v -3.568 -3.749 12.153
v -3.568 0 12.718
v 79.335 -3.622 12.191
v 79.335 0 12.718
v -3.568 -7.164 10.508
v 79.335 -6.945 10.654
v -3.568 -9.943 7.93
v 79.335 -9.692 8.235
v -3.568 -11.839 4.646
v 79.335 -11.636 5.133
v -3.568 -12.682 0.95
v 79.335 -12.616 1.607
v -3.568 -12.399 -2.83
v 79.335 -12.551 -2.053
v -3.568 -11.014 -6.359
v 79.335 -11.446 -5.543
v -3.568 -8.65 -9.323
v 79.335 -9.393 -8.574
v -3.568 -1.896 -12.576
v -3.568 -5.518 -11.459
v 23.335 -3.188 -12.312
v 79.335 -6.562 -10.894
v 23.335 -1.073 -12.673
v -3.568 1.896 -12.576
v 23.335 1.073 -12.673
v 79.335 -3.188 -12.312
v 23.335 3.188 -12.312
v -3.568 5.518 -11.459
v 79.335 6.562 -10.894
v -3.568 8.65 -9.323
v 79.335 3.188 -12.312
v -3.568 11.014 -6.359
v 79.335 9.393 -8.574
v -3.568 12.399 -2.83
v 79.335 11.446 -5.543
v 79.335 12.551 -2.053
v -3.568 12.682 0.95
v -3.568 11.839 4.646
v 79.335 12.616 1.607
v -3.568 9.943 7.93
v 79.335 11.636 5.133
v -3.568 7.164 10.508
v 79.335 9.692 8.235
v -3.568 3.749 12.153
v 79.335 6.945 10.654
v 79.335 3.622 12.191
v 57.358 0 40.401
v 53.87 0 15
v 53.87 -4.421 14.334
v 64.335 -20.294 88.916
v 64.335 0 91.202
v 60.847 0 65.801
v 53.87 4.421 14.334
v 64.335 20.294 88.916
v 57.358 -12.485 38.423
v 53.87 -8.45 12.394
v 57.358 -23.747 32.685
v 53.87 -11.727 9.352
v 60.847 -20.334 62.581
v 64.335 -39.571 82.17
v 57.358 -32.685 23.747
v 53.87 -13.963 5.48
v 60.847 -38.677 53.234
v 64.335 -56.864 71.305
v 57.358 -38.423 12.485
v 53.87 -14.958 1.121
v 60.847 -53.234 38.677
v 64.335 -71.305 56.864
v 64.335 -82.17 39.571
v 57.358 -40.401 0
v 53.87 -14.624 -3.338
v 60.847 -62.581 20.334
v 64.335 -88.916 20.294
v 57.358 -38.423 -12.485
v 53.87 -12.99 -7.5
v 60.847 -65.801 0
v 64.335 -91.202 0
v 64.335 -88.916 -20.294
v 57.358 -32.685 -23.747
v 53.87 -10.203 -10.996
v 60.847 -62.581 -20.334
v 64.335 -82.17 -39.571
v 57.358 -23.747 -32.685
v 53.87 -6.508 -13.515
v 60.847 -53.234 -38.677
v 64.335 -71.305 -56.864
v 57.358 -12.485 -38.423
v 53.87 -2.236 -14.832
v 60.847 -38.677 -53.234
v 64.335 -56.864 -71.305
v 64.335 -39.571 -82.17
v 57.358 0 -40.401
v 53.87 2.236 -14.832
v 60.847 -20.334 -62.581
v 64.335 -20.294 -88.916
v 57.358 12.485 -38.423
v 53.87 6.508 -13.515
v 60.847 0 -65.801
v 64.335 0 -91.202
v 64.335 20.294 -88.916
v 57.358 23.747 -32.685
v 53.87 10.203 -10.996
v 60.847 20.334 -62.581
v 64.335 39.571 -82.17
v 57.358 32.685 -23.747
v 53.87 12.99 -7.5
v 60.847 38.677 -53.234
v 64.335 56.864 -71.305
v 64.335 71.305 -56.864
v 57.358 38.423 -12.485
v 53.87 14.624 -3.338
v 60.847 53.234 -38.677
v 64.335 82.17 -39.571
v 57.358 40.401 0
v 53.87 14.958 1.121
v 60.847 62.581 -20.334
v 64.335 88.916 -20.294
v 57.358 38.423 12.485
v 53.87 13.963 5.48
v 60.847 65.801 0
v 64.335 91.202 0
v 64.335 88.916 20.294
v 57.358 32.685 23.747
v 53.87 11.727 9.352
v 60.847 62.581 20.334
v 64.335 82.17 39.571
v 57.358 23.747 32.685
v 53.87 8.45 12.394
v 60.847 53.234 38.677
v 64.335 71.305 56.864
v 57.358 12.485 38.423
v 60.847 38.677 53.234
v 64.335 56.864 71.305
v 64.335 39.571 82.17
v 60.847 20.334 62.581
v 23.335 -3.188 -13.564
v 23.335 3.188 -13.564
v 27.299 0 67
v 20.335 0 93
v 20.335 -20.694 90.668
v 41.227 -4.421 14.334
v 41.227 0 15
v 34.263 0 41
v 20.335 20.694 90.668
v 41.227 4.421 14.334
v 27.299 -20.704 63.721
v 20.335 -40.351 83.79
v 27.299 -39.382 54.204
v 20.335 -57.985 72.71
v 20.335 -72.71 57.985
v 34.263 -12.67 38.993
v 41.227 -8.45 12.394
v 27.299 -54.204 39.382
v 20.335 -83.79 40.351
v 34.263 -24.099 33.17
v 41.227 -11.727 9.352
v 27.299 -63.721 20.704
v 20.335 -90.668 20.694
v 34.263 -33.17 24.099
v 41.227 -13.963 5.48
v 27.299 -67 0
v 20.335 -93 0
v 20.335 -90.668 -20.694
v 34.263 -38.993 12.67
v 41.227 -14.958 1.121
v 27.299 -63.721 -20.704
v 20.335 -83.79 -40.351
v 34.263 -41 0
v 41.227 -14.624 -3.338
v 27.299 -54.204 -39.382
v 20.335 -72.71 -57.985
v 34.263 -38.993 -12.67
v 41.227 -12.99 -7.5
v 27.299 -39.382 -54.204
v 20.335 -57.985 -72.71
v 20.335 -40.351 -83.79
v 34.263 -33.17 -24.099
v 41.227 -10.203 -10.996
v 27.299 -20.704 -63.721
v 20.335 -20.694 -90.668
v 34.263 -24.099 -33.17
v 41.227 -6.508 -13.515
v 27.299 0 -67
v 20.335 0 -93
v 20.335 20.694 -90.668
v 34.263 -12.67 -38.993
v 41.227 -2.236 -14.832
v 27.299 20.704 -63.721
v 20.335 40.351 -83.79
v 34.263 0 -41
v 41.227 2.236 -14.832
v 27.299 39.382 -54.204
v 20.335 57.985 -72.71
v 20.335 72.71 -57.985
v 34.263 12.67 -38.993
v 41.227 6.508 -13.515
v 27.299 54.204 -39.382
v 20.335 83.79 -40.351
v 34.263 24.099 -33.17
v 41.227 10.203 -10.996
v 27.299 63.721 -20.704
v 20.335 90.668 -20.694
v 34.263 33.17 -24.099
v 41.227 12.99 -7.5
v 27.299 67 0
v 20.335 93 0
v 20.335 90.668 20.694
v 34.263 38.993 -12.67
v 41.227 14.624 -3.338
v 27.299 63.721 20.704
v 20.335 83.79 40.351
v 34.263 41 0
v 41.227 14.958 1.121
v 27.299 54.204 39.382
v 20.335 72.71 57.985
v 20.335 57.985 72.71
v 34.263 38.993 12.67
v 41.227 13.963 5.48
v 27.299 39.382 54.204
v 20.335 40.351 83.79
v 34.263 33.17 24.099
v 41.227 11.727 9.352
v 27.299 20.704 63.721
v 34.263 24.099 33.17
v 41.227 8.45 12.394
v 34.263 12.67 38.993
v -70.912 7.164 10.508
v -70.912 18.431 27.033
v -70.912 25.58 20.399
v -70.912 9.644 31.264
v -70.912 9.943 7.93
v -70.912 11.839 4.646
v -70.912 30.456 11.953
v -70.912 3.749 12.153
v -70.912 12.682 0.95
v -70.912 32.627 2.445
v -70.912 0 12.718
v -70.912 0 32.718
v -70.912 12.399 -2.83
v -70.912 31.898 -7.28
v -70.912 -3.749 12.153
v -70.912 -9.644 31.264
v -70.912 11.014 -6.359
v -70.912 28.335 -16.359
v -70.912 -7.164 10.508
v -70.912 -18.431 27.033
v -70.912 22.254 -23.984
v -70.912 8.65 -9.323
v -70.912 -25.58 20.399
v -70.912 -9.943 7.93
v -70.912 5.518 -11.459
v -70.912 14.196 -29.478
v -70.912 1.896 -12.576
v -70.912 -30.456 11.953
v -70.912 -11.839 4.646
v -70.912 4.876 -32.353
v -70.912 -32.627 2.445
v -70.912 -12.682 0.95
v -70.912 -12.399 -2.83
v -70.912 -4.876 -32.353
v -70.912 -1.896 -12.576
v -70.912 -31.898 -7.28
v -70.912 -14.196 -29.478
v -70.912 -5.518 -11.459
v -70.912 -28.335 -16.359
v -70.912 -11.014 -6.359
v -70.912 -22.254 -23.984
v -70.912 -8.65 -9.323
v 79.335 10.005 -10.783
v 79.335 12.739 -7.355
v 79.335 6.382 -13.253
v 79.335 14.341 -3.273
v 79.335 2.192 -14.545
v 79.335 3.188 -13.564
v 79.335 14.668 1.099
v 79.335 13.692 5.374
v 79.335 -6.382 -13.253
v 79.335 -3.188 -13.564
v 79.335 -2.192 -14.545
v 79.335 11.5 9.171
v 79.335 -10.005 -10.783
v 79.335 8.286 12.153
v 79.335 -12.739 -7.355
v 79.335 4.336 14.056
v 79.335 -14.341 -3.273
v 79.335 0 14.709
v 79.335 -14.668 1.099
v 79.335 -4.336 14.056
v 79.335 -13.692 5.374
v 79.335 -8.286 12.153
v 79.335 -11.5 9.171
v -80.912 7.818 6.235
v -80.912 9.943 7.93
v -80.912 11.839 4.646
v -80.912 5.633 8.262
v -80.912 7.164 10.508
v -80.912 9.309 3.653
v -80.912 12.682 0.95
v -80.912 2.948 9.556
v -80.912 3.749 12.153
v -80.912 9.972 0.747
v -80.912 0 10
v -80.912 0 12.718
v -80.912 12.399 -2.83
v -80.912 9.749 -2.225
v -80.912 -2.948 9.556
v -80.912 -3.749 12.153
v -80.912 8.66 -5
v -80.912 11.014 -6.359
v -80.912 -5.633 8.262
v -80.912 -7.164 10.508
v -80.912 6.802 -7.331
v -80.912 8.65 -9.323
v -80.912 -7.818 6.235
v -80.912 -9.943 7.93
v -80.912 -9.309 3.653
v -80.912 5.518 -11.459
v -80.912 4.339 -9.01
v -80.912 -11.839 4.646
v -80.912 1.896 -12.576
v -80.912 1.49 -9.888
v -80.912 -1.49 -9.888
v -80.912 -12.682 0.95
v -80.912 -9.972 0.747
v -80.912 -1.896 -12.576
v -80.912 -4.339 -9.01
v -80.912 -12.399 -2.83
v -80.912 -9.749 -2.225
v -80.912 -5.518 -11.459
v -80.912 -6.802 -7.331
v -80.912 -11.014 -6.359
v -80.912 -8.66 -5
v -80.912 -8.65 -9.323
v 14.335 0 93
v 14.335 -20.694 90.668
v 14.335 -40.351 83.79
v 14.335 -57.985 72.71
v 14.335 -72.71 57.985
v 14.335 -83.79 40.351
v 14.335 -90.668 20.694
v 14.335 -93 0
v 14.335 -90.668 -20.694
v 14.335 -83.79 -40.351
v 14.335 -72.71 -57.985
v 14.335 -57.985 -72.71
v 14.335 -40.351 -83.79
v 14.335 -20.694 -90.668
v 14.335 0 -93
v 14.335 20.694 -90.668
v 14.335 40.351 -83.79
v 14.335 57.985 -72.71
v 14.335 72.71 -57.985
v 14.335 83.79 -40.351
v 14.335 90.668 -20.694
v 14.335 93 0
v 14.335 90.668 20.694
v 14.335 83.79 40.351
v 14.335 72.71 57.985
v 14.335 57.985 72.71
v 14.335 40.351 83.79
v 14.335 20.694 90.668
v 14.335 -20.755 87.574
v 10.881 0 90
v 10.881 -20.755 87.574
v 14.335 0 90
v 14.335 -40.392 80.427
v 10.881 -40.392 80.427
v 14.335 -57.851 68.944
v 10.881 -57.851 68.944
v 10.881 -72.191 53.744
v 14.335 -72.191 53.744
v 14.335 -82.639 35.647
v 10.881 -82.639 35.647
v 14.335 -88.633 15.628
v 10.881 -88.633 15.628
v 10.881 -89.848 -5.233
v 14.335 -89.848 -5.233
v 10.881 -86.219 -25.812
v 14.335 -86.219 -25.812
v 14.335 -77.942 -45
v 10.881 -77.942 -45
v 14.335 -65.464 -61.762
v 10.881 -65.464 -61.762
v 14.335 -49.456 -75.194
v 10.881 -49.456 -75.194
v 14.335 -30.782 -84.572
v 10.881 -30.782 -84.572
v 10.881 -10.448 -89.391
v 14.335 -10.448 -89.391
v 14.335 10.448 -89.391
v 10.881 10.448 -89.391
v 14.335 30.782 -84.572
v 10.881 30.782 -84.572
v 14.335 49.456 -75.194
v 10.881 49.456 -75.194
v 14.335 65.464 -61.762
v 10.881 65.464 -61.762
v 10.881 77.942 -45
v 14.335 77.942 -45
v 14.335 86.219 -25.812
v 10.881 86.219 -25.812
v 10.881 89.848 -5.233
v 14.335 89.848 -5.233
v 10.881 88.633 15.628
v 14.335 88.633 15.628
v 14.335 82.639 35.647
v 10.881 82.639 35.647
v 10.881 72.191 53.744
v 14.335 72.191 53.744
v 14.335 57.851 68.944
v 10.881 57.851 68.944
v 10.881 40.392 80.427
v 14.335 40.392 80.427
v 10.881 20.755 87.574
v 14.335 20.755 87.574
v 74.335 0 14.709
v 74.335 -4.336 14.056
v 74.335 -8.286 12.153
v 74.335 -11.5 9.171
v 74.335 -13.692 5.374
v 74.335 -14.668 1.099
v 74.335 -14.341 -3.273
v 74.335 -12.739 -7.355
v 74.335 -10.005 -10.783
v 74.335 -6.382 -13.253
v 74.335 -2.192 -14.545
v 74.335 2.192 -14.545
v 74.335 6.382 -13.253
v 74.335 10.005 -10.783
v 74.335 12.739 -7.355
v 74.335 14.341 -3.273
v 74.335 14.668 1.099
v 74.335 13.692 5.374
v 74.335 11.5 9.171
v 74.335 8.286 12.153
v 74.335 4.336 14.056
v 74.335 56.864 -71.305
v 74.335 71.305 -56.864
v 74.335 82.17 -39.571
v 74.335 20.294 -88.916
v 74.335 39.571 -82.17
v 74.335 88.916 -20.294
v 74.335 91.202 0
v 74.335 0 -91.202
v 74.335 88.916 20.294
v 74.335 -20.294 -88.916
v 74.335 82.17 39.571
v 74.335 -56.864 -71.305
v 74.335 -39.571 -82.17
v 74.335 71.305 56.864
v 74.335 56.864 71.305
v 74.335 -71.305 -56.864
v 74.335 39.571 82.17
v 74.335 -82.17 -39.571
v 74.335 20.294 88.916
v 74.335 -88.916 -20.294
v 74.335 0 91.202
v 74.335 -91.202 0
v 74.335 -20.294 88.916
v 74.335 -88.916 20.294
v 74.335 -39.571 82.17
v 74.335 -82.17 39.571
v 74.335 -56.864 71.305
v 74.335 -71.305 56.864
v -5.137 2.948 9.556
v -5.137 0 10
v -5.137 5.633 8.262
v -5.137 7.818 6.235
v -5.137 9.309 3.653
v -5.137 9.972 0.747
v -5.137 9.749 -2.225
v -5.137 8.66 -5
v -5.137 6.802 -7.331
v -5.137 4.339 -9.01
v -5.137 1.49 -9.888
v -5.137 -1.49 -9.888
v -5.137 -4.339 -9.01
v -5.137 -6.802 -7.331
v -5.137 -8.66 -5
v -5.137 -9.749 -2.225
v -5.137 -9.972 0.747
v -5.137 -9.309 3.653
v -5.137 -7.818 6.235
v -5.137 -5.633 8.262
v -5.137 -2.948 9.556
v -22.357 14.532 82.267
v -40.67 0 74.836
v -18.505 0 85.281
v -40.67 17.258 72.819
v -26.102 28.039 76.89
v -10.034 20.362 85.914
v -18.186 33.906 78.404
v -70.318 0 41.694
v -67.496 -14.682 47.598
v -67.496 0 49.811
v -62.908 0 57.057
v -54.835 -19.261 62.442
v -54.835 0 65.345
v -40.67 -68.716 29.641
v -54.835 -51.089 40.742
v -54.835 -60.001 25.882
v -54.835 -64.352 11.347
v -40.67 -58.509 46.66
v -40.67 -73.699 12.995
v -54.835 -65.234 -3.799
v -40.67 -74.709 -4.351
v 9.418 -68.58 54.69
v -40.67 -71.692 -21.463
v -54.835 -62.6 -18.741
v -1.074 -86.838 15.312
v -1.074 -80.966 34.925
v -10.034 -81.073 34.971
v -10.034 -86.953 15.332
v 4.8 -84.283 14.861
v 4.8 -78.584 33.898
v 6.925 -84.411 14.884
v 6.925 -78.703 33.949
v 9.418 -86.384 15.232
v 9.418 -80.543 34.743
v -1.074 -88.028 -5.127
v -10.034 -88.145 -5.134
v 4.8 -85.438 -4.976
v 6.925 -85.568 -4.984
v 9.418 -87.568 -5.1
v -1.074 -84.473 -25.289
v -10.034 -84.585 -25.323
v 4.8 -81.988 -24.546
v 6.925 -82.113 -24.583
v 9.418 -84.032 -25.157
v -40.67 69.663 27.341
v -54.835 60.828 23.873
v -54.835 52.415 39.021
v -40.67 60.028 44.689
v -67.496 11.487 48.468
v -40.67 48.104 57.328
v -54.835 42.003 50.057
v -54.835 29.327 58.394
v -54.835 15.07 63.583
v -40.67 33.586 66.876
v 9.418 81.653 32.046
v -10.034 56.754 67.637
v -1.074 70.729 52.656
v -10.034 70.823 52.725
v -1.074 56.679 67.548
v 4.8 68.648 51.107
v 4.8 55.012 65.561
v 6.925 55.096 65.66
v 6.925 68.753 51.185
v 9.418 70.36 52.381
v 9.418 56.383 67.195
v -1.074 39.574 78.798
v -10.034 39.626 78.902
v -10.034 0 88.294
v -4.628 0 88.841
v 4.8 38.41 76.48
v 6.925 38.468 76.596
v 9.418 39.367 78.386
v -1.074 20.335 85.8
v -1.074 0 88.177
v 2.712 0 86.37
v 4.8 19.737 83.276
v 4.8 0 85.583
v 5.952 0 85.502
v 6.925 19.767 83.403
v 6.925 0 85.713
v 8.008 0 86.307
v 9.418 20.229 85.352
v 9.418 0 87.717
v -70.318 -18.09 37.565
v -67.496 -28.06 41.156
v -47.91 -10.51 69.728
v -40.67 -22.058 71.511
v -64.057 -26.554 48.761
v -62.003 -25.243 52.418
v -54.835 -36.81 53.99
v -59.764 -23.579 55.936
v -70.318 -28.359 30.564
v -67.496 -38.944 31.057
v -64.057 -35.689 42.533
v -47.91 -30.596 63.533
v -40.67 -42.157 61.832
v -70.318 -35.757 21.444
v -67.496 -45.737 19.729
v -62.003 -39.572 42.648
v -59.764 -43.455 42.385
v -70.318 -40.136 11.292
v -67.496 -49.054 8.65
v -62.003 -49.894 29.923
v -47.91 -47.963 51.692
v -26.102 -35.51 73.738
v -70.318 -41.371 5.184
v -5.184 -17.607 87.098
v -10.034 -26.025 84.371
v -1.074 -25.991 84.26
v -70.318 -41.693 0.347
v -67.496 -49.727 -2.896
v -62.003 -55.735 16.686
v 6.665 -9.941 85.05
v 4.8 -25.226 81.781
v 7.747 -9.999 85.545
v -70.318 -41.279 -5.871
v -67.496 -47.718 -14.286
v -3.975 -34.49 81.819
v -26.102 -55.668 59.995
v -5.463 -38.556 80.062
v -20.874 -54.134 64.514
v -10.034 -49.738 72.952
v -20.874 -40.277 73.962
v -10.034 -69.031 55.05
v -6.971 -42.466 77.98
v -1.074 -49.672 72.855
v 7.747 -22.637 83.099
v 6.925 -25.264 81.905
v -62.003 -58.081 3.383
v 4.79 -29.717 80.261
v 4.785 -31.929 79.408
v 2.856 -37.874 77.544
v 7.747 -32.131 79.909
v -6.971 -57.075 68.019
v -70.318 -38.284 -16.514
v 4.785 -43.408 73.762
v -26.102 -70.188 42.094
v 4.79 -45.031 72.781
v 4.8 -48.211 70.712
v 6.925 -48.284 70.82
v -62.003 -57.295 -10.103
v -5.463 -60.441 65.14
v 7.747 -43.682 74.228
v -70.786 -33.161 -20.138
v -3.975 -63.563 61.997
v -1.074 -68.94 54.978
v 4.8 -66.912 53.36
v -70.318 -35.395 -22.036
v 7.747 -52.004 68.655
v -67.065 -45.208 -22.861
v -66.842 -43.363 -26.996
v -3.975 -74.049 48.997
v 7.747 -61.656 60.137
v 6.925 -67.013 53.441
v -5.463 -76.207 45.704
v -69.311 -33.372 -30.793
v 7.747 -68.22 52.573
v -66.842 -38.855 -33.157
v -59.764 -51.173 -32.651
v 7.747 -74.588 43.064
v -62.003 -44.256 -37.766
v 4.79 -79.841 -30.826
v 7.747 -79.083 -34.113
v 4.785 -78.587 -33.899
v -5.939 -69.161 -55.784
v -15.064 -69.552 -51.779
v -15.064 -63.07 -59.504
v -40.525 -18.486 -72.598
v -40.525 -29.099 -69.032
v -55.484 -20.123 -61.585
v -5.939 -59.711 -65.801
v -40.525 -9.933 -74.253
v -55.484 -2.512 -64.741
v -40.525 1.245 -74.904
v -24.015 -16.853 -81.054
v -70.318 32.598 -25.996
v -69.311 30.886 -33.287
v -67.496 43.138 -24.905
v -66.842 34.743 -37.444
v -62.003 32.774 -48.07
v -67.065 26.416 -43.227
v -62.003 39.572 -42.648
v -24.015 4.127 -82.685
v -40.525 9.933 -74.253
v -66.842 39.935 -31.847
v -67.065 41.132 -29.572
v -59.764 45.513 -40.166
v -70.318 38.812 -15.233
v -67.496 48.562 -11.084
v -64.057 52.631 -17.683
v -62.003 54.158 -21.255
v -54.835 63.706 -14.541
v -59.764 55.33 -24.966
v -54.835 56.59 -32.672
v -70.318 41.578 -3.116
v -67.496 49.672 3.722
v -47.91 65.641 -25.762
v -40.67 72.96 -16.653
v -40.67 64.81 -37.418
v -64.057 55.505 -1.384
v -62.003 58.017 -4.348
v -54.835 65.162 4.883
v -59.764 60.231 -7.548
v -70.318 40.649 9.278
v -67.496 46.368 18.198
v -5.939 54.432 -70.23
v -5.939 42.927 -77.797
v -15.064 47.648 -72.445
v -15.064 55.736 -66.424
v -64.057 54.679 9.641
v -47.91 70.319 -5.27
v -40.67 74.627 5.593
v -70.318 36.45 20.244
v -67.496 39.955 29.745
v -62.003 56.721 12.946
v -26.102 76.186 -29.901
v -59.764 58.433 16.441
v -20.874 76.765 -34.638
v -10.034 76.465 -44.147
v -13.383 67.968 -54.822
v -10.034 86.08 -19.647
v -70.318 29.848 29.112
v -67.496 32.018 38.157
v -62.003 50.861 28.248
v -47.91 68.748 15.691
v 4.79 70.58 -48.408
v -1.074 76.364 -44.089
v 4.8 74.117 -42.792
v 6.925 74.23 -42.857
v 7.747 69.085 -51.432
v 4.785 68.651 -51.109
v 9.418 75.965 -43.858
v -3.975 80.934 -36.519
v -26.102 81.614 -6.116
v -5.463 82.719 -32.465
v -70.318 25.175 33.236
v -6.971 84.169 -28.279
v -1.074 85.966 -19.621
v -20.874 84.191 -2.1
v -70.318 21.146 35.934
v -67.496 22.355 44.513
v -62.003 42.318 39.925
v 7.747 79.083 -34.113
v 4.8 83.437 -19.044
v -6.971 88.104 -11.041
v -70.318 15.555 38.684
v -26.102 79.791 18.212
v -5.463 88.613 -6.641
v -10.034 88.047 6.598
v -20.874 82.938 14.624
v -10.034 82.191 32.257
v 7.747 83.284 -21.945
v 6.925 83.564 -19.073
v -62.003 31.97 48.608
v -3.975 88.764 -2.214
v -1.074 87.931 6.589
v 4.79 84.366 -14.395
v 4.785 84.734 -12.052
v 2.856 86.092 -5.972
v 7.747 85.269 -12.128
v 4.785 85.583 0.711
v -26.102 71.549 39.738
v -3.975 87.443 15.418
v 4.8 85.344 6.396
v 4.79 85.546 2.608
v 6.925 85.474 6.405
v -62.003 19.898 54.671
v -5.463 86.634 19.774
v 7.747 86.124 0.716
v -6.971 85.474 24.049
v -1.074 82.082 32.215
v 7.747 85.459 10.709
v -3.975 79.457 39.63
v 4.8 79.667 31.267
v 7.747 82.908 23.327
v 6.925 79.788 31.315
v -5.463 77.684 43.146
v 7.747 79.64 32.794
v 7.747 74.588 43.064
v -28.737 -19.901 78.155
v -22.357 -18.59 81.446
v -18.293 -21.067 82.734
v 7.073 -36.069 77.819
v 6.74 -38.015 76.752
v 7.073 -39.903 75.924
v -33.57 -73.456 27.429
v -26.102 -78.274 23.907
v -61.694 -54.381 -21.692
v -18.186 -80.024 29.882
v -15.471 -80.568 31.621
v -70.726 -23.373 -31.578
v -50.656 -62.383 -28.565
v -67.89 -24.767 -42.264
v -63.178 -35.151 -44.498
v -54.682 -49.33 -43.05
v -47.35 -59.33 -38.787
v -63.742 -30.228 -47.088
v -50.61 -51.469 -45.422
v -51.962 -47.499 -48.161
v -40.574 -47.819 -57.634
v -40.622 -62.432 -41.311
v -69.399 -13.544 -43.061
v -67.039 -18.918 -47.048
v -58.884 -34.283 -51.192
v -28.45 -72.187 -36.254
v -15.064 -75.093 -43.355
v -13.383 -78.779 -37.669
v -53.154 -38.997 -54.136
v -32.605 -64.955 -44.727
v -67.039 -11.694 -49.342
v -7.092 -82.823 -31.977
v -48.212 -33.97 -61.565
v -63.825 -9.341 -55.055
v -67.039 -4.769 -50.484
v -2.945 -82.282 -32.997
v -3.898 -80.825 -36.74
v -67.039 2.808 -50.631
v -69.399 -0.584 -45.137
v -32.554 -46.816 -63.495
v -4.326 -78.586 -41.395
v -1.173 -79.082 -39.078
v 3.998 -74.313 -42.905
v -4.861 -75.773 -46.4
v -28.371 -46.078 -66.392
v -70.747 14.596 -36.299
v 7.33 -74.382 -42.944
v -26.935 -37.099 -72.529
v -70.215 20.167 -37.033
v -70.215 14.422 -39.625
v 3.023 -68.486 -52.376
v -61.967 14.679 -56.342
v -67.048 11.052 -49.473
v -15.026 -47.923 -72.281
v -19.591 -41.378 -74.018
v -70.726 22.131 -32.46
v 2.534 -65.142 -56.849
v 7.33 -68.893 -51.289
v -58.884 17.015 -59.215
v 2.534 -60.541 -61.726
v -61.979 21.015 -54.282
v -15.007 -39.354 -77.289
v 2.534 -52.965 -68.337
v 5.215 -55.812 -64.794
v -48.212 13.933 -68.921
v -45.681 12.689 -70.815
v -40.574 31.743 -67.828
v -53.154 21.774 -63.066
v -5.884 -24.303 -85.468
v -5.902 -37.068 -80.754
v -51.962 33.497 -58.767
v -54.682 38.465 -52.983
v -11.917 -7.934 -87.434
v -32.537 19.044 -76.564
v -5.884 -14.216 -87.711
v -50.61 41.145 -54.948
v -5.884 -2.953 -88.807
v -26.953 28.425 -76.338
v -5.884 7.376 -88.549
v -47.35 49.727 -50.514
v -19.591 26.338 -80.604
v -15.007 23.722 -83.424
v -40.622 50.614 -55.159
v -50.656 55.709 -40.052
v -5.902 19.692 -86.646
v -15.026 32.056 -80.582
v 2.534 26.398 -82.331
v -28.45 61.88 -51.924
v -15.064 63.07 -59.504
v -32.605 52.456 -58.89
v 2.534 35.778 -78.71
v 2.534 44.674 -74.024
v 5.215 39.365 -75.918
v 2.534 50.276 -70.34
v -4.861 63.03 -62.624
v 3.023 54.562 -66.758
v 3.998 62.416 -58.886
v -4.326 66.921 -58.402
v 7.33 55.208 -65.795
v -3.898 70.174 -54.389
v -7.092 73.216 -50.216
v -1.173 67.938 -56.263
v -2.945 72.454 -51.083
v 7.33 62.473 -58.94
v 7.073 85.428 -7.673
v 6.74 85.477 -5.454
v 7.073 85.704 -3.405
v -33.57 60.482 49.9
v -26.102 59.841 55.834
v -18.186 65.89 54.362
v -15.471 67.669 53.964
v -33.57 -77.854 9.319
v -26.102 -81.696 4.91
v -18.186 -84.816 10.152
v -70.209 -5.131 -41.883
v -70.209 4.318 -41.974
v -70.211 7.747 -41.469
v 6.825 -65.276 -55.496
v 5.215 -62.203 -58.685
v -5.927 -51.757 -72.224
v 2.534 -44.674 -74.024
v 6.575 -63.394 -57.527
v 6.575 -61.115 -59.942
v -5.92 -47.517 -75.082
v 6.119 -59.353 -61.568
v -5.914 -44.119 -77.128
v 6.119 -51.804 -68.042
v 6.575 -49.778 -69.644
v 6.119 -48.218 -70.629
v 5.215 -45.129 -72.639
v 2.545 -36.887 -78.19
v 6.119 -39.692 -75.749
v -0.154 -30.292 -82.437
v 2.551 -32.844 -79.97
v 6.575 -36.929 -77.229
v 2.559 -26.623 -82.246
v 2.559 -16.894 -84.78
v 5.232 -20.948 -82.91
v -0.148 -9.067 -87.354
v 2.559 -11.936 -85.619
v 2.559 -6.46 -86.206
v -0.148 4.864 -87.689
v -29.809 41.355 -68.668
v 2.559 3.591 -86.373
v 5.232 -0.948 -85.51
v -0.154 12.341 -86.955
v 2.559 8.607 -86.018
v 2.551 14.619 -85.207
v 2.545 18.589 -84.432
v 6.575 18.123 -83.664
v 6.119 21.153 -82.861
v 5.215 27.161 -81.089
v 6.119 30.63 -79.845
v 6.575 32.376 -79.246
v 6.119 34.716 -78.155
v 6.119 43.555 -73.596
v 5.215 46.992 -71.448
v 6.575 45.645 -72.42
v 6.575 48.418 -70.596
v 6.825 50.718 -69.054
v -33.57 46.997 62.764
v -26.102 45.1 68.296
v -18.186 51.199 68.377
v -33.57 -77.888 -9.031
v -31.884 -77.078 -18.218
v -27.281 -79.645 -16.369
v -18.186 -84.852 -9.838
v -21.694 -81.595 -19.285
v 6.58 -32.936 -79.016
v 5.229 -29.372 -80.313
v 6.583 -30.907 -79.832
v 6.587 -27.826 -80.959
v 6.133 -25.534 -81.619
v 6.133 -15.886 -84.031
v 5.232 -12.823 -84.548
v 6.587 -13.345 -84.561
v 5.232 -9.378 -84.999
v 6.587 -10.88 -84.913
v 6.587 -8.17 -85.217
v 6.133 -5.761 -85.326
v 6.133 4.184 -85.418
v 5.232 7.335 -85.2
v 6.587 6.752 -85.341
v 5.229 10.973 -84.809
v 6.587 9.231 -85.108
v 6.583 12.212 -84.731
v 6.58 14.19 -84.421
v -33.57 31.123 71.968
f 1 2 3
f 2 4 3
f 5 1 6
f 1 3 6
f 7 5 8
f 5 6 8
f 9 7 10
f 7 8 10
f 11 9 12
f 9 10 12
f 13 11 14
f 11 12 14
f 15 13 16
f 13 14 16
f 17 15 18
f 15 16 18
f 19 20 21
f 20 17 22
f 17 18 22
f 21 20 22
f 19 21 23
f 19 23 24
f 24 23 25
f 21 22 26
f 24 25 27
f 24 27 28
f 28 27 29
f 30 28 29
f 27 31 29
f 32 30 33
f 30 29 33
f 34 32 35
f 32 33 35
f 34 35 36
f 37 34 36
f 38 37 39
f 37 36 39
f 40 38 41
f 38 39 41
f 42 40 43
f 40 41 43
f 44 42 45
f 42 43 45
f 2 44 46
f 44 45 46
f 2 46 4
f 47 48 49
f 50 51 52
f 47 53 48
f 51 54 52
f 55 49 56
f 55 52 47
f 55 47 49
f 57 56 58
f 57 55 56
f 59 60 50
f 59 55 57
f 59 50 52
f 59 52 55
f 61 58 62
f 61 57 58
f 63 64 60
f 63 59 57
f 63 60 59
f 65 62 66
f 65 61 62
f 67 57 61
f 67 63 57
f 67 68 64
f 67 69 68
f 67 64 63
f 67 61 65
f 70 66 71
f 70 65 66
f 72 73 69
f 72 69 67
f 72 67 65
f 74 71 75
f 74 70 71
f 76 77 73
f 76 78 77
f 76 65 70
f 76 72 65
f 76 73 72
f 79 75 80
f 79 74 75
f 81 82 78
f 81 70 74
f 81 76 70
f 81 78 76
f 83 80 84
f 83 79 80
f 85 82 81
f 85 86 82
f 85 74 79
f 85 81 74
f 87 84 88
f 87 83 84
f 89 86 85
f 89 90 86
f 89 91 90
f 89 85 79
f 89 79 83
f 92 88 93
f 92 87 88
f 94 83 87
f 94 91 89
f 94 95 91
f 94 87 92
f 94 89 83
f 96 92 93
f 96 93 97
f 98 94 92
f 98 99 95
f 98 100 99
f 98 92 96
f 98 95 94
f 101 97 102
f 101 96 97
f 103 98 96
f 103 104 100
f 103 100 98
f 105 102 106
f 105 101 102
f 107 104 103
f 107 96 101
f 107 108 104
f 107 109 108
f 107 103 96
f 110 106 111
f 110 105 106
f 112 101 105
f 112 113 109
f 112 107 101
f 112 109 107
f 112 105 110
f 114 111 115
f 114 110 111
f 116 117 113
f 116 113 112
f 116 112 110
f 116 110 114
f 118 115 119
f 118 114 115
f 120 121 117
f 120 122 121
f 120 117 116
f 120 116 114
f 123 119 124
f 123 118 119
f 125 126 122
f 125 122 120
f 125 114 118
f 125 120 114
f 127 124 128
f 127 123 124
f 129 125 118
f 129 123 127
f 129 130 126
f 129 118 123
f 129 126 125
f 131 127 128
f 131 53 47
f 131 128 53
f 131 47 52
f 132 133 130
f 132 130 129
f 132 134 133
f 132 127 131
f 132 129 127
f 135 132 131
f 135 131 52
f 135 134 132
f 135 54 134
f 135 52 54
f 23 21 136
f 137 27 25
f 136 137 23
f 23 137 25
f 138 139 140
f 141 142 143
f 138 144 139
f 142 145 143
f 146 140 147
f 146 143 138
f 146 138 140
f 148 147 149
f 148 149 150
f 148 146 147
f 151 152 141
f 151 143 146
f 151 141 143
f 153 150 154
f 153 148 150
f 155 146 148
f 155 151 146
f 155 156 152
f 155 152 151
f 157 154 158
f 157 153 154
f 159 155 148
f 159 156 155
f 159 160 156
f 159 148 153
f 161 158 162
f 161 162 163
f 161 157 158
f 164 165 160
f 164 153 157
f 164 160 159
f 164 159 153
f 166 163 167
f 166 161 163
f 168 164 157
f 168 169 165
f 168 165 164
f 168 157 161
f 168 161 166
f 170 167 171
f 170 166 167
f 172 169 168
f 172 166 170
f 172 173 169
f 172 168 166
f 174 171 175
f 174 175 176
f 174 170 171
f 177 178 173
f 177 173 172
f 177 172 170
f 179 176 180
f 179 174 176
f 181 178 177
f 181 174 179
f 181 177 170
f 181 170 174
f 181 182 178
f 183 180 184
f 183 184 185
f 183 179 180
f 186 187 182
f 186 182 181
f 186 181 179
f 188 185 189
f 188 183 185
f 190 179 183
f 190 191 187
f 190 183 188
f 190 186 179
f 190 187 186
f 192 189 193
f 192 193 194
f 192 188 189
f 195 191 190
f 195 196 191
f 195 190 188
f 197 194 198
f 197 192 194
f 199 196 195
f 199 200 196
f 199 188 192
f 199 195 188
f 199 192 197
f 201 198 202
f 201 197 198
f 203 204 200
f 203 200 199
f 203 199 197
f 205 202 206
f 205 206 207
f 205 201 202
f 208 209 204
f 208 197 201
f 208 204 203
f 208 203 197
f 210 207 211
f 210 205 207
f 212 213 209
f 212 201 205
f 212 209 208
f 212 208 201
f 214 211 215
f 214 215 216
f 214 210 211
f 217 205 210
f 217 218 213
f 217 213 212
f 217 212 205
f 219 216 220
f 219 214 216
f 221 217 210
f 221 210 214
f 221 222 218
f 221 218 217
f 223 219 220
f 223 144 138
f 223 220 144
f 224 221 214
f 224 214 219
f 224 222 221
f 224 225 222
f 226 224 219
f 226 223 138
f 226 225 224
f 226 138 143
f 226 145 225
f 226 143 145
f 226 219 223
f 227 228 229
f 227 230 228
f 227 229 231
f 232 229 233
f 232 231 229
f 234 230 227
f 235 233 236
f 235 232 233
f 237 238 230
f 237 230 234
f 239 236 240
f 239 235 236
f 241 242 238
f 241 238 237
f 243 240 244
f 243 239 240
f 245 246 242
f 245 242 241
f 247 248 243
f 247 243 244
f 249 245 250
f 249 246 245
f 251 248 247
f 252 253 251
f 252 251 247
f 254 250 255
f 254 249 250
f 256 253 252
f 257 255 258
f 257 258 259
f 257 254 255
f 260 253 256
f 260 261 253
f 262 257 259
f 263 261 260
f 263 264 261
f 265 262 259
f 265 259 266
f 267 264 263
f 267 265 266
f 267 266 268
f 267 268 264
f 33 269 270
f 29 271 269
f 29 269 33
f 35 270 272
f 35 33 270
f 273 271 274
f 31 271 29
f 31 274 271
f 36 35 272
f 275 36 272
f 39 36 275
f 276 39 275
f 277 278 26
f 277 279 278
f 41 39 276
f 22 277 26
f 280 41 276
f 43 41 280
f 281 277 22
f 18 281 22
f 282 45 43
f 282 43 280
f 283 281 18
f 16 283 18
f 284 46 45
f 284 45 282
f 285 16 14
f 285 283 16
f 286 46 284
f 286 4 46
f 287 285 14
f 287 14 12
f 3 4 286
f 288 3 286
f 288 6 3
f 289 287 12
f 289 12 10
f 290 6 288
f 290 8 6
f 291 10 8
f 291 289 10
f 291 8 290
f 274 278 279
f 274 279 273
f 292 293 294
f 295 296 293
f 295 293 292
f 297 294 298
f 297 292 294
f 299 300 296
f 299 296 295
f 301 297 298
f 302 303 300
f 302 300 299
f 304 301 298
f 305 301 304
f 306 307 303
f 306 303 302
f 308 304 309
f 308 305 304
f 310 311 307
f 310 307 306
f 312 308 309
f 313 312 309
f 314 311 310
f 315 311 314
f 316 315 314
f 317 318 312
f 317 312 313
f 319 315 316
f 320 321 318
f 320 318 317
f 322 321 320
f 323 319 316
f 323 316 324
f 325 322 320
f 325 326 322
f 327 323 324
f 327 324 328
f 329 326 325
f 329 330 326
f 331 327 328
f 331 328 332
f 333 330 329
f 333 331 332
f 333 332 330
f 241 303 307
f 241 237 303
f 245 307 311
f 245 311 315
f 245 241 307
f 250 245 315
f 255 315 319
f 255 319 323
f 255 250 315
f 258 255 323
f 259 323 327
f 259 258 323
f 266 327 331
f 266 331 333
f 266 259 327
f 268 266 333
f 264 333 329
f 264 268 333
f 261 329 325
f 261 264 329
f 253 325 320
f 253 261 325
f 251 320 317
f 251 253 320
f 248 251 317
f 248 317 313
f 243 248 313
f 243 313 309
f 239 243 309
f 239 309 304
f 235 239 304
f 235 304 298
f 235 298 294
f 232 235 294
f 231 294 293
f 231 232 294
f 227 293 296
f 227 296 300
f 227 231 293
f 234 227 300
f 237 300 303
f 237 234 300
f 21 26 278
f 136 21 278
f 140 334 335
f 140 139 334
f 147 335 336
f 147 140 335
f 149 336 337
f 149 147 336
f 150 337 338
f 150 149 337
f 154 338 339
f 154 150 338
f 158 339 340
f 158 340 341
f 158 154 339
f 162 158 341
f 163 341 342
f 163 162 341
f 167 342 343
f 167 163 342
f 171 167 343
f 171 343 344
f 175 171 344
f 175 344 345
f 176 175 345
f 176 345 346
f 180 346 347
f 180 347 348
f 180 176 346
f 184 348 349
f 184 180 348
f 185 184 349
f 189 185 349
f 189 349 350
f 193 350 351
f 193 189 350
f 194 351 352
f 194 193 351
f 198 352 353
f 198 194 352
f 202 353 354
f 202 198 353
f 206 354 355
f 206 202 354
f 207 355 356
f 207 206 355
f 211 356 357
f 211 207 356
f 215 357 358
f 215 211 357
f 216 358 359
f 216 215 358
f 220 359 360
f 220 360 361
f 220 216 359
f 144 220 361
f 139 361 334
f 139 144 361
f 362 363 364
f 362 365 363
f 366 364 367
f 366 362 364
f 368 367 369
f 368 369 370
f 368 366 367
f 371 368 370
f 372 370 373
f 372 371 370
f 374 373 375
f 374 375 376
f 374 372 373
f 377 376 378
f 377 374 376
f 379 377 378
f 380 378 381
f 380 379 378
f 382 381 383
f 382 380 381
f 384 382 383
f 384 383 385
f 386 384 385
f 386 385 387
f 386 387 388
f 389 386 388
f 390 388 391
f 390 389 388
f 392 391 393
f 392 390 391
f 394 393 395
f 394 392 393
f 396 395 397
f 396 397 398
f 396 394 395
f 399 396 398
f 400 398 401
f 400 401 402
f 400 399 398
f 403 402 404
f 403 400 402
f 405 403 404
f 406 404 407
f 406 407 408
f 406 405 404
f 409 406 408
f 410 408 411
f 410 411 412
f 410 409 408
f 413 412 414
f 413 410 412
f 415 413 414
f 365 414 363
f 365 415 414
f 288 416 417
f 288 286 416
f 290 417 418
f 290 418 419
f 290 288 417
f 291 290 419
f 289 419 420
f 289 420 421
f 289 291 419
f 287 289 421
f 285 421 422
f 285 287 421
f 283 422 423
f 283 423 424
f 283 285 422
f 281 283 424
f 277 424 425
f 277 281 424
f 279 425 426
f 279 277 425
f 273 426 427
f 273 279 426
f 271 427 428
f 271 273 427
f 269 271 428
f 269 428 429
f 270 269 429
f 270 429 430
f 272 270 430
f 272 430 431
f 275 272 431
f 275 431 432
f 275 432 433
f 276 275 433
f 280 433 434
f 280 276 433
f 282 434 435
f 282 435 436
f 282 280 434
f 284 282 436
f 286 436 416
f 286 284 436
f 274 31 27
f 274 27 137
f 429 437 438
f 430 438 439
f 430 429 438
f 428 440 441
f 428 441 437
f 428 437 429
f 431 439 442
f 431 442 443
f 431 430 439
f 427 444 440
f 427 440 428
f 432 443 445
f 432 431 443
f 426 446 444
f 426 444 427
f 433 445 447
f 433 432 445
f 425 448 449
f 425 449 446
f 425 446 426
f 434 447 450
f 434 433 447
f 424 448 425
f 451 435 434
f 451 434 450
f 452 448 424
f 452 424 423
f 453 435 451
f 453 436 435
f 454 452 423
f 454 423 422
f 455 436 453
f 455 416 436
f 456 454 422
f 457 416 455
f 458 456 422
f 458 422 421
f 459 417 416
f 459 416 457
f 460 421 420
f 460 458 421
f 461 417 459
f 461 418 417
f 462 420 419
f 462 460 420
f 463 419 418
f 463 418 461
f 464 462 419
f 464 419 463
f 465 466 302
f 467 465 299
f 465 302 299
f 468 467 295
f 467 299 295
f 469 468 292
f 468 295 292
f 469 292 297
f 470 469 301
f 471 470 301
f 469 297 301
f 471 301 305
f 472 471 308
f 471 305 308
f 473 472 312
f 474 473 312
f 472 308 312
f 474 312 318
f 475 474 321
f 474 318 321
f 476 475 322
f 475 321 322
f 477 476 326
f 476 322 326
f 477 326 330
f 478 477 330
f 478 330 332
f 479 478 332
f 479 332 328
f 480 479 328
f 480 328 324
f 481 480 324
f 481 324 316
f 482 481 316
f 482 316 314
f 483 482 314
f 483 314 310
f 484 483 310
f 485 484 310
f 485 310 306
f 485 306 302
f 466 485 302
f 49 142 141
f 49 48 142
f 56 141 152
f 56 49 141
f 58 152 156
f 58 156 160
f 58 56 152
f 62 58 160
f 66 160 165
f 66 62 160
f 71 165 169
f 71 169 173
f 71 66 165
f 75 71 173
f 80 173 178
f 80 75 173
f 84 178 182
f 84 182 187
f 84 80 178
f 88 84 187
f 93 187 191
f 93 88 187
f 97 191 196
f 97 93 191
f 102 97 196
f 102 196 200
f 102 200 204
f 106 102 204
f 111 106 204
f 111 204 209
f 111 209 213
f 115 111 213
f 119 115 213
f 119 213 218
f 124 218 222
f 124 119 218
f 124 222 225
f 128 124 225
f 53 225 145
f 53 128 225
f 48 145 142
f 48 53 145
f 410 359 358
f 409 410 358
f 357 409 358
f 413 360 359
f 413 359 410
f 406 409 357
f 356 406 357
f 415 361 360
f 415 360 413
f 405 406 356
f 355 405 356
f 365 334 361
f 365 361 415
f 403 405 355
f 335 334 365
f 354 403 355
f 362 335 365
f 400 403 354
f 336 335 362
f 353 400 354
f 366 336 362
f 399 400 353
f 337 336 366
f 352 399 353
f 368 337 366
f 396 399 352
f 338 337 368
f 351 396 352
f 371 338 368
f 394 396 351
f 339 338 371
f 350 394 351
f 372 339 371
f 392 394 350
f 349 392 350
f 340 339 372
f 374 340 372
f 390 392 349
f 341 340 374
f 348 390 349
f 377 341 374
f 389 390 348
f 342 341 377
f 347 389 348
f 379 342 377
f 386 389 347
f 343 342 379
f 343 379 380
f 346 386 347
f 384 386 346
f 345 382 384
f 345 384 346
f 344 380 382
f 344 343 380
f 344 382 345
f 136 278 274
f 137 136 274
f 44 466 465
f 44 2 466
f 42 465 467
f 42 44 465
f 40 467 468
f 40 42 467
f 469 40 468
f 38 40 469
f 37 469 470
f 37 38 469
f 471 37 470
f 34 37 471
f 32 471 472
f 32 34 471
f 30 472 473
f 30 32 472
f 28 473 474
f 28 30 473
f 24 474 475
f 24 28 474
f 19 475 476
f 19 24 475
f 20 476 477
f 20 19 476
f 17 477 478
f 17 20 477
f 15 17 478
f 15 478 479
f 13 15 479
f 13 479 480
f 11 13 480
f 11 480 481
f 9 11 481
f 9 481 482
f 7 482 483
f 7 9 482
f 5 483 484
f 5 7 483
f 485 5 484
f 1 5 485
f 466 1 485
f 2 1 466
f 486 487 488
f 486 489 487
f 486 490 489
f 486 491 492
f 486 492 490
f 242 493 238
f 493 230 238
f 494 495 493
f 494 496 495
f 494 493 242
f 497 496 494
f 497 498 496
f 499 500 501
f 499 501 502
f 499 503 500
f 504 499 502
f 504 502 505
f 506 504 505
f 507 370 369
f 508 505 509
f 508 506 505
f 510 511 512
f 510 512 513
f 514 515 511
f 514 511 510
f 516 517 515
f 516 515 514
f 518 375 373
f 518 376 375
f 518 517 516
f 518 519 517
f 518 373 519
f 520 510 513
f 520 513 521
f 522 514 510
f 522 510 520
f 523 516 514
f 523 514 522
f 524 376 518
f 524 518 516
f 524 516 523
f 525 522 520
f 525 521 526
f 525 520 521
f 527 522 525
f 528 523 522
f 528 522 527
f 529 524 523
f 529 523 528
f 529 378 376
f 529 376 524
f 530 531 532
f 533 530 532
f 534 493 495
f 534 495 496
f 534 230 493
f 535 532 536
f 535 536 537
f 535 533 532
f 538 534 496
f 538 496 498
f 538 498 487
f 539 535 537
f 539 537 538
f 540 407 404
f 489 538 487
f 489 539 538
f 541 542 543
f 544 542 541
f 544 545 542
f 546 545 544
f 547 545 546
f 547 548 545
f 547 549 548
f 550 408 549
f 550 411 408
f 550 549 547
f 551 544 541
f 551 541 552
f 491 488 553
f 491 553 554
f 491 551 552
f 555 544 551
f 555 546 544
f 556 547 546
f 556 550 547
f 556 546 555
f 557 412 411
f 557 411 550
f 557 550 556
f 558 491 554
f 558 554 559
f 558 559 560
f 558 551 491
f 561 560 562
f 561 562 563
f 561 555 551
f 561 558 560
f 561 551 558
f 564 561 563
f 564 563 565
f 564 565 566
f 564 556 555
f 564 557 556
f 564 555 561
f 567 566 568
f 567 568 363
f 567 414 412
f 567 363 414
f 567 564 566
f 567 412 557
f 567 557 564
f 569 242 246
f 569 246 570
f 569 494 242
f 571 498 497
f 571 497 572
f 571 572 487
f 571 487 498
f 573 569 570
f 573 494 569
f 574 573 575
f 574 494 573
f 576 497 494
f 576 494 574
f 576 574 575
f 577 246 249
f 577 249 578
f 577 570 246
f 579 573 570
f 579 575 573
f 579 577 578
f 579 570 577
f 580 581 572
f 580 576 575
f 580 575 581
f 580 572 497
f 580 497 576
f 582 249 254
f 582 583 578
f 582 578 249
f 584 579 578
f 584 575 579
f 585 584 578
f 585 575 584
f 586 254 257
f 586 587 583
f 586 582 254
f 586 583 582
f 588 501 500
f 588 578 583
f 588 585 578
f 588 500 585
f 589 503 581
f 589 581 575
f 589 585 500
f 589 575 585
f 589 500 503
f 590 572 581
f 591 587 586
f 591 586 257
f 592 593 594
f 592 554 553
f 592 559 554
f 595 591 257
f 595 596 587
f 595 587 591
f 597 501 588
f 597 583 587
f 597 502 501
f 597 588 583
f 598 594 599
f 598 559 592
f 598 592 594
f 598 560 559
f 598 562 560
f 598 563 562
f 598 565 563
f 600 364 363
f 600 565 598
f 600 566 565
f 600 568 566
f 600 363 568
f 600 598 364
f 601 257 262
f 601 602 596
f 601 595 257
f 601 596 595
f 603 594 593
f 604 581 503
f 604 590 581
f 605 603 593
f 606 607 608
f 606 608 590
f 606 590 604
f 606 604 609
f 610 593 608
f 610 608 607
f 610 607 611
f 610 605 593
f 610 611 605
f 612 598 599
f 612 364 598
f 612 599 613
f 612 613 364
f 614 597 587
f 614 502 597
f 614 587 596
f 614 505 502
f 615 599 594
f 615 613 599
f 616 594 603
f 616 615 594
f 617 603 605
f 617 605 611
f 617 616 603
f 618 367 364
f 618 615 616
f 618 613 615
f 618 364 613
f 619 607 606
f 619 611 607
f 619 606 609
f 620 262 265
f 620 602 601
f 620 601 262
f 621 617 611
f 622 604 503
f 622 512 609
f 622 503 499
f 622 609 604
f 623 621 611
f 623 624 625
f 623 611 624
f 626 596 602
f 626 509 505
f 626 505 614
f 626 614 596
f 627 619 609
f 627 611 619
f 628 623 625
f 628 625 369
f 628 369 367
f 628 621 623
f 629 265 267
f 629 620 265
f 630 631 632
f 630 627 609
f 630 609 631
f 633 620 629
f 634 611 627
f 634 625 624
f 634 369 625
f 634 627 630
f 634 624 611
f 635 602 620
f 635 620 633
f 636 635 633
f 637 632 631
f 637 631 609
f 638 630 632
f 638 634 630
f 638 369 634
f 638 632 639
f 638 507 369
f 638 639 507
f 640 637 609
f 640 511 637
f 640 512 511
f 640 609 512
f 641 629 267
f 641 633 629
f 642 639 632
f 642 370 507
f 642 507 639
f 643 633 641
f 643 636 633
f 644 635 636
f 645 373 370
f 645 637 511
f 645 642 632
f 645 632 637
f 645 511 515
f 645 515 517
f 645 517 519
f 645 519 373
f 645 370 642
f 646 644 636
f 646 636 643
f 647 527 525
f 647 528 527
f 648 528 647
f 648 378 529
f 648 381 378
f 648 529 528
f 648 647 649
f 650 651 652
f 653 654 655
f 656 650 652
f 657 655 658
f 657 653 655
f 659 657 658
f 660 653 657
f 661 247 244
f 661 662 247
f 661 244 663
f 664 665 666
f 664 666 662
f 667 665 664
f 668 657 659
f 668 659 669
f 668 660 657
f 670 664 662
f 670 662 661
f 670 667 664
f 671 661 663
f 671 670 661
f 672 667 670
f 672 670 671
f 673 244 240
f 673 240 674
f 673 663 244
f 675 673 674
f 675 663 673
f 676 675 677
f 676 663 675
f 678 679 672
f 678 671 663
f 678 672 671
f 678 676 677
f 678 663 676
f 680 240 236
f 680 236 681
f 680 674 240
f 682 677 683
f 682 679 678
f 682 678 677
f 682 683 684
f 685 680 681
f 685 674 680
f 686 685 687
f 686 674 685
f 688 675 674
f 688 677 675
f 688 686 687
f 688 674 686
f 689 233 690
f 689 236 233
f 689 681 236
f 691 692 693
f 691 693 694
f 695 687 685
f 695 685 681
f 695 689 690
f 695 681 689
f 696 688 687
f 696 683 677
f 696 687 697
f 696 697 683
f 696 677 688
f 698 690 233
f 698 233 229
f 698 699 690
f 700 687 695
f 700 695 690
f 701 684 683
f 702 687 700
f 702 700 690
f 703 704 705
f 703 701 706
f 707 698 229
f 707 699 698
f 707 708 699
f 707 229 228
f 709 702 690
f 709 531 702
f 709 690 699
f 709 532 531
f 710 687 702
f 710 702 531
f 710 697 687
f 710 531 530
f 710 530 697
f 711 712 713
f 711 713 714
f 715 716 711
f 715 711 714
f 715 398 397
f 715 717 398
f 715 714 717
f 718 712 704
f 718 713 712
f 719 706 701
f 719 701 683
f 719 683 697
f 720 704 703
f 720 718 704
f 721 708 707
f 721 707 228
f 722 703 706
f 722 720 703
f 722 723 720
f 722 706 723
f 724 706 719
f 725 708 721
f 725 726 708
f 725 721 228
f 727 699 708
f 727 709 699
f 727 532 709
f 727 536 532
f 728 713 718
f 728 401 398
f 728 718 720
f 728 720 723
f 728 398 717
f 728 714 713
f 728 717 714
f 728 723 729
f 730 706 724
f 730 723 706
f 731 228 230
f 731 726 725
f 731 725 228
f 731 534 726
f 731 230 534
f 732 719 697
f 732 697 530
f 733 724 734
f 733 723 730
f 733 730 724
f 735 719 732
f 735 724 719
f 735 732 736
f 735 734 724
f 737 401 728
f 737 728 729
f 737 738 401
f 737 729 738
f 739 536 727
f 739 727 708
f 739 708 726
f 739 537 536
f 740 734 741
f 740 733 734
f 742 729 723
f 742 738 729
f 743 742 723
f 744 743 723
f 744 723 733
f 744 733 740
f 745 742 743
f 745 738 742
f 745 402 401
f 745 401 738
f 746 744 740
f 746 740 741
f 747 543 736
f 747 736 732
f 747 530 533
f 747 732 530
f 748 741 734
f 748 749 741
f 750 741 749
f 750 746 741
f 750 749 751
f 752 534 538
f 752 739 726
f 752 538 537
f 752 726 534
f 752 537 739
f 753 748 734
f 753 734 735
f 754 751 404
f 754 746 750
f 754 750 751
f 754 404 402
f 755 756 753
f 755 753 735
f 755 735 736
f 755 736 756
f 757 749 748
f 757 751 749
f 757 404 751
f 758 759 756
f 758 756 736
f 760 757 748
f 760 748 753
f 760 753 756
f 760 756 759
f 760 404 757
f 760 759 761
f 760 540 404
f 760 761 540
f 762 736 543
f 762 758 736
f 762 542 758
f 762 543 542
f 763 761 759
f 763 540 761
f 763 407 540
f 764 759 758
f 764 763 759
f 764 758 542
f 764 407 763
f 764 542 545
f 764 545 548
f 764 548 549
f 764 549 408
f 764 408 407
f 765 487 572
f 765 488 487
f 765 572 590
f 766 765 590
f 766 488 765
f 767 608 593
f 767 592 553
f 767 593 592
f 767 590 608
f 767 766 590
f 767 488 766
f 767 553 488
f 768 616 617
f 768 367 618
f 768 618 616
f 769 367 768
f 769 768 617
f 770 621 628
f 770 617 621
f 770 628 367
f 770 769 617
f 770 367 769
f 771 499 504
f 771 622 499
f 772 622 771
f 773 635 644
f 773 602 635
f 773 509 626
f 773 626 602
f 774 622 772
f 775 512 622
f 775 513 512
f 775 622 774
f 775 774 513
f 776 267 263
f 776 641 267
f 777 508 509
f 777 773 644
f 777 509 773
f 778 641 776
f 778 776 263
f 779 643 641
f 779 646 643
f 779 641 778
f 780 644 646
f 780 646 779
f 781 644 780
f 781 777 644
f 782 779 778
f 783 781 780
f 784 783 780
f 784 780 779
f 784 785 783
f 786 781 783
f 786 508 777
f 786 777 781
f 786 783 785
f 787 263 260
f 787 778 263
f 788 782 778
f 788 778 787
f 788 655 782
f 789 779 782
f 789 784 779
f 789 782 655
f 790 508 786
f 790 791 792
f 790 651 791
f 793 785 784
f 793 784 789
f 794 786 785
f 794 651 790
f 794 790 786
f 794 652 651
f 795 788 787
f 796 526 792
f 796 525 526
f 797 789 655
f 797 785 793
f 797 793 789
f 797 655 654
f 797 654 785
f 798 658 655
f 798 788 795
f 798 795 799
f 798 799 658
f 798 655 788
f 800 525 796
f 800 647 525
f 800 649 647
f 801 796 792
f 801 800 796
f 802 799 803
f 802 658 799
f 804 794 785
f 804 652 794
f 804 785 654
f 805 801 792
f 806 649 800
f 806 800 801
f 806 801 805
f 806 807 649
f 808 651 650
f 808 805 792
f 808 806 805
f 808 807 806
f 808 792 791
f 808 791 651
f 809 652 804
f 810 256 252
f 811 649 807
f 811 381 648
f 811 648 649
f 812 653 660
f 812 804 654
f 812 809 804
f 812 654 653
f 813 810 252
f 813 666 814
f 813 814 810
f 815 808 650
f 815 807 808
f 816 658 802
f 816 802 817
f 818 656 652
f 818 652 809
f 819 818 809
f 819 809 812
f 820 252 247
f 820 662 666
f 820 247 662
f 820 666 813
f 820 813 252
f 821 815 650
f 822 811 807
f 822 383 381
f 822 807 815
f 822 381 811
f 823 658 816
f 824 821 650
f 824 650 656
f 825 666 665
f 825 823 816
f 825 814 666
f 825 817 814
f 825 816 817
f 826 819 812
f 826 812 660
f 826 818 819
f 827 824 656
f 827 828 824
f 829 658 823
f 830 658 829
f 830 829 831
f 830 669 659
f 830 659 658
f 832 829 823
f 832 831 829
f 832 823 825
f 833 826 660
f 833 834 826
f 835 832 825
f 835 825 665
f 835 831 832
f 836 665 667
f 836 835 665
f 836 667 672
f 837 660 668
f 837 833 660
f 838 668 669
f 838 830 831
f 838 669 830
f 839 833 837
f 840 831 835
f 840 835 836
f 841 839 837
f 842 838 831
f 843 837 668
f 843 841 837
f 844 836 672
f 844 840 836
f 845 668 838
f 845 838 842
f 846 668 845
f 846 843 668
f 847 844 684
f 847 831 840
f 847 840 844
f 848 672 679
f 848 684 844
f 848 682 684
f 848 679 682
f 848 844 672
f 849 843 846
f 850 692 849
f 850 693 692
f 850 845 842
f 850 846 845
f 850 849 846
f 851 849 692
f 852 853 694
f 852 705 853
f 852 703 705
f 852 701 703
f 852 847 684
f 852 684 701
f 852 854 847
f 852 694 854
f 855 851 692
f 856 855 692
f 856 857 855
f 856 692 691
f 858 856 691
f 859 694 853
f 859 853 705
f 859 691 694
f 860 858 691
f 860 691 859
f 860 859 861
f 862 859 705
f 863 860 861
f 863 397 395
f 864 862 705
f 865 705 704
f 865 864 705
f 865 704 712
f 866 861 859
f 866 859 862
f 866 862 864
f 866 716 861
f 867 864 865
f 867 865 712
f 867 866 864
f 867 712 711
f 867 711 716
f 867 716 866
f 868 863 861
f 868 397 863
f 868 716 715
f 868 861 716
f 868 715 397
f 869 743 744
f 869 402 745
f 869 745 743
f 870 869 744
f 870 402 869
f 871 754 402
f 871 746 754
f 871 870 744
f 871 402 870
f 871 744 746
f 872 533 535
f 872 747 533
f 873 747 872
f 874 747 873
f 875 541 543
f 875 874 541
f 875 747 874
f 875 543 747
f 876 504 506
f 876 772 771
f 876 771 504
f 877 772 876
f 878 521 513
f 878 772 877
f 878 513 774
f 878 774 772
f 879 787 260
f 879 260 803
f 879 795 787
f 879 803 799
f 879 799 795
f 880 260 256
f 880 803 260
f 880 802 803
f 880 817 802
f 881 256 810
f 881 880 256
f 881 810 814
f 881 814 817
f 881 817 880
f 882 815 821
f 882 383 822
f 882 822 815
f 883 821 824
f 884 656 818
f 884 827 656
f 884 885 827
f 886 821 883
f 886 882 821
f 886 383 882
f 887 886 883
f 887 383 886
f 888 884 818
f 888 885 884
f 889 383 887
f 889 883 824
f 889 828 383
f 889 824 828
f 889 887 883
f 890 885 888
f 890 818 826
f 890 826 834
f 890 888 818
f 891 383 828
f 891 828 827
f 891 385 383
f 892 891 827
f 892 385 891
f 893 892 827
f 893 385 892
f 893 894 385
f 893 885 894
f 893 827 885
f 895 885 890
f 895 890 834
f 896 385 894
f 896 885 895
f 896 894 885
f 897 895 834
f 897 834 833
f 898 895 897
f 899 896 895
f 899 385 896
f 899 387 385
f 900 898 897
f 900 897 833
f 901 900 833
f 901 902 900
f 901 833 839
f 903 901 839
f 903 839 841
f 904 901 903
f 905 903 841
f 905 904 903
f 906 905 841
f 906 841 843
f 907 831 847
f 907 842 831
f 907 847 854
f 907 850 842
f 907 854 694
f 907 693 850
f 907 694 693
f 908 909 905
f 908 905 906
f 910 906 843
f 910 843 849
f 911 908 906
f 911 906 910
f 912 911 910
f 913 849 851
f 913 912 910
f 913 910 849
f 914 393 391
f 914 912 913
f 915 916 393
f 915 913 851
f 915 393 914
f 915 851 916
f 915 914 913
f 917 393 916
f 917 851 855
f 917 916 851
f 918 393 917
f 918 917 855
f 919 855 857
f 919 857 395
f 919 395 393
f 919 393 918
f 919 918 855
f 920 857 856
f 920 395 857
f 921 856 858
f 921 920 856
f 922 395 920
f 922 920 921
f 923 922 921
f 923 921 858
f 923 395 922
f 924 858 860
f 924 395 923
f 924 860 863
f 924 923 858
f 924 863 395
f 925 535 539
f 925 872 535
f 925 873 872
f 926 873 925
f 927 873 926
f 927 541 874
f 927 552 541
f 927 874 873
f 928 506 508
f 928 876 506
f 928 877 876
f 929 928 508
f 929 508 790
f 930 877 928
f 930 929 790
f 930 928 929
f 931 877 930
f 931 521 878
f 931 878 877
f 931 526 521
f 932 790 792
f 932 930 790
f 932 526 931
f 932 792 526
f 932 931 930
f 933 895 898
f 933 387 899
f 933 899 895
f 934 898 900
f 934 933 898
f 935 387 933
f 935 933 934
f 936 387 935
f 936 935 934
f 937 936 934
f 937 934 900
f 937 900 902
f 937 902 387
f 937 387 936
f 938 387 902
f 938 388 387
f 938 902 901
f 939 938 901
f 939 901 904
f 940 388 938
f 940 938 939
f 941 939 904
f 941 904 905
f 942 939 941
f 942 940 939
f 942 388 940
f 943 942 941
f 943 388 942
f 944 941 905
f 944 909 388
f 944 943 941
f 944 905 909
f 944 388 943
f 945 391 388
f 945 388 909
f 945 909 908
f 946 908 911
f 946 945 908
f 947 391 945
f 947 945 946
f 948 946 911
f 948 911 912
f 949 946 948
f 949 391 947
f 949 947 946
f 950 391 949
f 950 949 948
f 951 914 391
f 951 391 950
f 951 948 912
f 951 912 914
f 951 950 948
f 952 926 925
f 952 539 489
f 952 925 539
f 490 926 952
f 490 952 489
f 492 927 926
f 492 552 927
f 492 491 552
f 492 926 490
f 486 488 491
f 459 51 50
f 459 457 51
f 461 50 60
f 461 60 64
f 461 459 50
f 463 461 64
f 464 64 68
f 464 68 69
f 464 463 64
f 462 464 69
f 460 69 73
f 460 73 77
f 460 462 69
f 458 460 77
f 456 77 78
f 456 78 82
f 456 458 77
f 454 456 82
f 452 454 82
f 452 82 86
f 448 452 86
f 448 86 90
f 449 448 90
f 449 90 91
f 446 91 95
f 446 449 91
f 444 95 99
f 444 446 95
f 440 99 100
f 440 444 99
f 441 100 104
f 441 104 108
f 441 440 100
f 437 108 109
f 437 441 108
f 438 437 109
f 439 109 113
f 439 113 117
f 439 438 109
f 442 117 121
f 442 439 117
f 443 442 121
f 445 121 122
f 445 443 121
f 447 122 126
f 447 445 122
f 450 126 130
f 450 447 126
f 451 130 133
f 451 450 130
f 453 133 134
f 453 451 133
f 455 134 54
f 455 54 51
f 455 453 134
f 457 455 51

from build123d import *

# Parameters (mm, degrees)
SKETCH2_R          = 12.718
CUT_EXTRUDE1_DEPTH = 82.74
SKETCH3_R          = 10
CUT_EXTRUDE2_DEPTH = 79.507
SKETCH4_W          = 1.691
SKETCH4_H          = 6.375
CUT_EXTRUDE3_DEPTH = 56


with BuildPart() as part:
    # Sketch1 → Revolve1 (revolve)
    with BuildSketch(Plane.XY, mode=Mode.PRIVATE) as revolve1_sk:
        with BuildLine():
            Line((-80.911998208, 0), (-80.911998208, 12.718))
            Line((-80.911998208, 12.718), (-70.911998208, 12.718))
            Line((-70.911998208, 12.718), (-70.911998208, 32.718))
            add(Edge.make_bspline(
                [(-70.911998208, 32.718), (-72.12061009, 49.624927681), (-53.086599537, 70.223127666), (-24.900561644, 82.171389104), (-2.569366769, 92.818520506), (6.899070449, 82.616568551), (10.881080371, 90)],
                knots=[0, 0, 0, 0, 0.424565584, 0.683651406, 0.890381035, 1, 1, 1, 1], degree=3))
            Line((10.881080371, 90), (14.335001792, 90))
            Line((14.335001792, 90), (14.335001792, 93))
            Line((14.335001792, 93), (20.335001792, 93))
            Line((20.335001792, 93), (41.227154337, 15))
            Line((41.227154337, 15), (53.870153491, 15))
            Line((53.870153491, 15), (64.335001792, 91.202154094))
            Line((64.335001792, 91.202154094), (74.335001792, 91.202154094))
            Line((74.335001792, 91.202154094), (74.335001792, 14.709294291))
            Line((74.335001792, 14.709294291), (79.335001792, 14.709294291))
            Line((79.335001792, 14.709294291), (79.335001792, 0))
            Line((79.335001792, 0), (-80.911998208, 0))
        make_face()
    revolve(revolve1_sk.sketch.rotate(Axis((-81.835688806, 0, 0), (1, 0, 0)), 90), axis=Axis((-81.835688806, 0, 0), (1, 0, 0)))

    # Sketch2 → Cut-Extrude1 (cut)
    with BuildSketch(Plane(origin=(79.335001792, 0, 0), x_dir=(0, 0, -1), z_dir=(1, 0, 0))):
        with Locations(Location((0, 0, 0), (0, 0, 180))):
            Circle(SKETCH2_R)
    extrude(amount=-CUT_EXTRUDE1_DEPTH, mode=Mode.SUBTRACT)

    # Sketch3 → Cut-Extrude2 (cut)
    with BuildSketch(Plane.ZY.offset(80.911998208)):
        Circle(SKETCH3_R)
    extrude(amount=-CUT_EXTRUDE2_DEPTH, mode=Mode.SUBTRACT)

    # Chamfer1
    # the kernel refuses this chamfer: 3, 1.732050808 mm, written as the material it takes off along each edge
    with BuildSketch(Plane(origin=(-3.404998208, 0, 0), x_dir=(0, 0, 1), z_dir=(0, -1, 0))) as chamfer1_piece_1_section:
        with BuildLine():
            Line((9.896076952, 1.792050808), (13.103923048, -0.06))
            Line((13.103923048, -0.06), (13.103923048, -0.12))
            ThreePointArc((13.103923048, -0.12), (11.551961524, -0.06), (10, -0.06))
            Line((10, -0.06), (9.94, 0))
            ThreePointArc((9.94, 0), (9.94, 0.896025404), (9.836076952, 1.792050808))
            Line((9.836076952, 1.792050808), (9.896076952, 1.792050808))
        make_face()
    chamfer1_piece_1 = revolve(axis=Axis((-3.404998208, 0, 0), (-1, 0, 0)), mode=Mode.PRIVATE)
    chamfer1_piece_1 = chamfer1_piece_1 & Plane(origin=(-4.331873762, 0, 0), x_dir=(0, 0, 1), z_dir=(1, 0, 0)) * Cylinder(12.718, 53, mode=Mode.PRIVATE)
    add(chamfer1_piece_1, mode=Mode.SUBTRACT)

    # Sketch4 → Cut-Extrude3 (cut)
    with BuildSketch(Plane(origin=(79.335001792, 0, 0), x_dir=(0, 0, -1), z_dir=(1, 0, 0))):
        with Locations((12.718, 0)):
            Rectangle(SKETCH4_W, SKETCH4_H)
    extrude(amount=-CUT_EXTRUDE3_DEPTH, mode=Mode.SUBTRACT)


solid = part.part
